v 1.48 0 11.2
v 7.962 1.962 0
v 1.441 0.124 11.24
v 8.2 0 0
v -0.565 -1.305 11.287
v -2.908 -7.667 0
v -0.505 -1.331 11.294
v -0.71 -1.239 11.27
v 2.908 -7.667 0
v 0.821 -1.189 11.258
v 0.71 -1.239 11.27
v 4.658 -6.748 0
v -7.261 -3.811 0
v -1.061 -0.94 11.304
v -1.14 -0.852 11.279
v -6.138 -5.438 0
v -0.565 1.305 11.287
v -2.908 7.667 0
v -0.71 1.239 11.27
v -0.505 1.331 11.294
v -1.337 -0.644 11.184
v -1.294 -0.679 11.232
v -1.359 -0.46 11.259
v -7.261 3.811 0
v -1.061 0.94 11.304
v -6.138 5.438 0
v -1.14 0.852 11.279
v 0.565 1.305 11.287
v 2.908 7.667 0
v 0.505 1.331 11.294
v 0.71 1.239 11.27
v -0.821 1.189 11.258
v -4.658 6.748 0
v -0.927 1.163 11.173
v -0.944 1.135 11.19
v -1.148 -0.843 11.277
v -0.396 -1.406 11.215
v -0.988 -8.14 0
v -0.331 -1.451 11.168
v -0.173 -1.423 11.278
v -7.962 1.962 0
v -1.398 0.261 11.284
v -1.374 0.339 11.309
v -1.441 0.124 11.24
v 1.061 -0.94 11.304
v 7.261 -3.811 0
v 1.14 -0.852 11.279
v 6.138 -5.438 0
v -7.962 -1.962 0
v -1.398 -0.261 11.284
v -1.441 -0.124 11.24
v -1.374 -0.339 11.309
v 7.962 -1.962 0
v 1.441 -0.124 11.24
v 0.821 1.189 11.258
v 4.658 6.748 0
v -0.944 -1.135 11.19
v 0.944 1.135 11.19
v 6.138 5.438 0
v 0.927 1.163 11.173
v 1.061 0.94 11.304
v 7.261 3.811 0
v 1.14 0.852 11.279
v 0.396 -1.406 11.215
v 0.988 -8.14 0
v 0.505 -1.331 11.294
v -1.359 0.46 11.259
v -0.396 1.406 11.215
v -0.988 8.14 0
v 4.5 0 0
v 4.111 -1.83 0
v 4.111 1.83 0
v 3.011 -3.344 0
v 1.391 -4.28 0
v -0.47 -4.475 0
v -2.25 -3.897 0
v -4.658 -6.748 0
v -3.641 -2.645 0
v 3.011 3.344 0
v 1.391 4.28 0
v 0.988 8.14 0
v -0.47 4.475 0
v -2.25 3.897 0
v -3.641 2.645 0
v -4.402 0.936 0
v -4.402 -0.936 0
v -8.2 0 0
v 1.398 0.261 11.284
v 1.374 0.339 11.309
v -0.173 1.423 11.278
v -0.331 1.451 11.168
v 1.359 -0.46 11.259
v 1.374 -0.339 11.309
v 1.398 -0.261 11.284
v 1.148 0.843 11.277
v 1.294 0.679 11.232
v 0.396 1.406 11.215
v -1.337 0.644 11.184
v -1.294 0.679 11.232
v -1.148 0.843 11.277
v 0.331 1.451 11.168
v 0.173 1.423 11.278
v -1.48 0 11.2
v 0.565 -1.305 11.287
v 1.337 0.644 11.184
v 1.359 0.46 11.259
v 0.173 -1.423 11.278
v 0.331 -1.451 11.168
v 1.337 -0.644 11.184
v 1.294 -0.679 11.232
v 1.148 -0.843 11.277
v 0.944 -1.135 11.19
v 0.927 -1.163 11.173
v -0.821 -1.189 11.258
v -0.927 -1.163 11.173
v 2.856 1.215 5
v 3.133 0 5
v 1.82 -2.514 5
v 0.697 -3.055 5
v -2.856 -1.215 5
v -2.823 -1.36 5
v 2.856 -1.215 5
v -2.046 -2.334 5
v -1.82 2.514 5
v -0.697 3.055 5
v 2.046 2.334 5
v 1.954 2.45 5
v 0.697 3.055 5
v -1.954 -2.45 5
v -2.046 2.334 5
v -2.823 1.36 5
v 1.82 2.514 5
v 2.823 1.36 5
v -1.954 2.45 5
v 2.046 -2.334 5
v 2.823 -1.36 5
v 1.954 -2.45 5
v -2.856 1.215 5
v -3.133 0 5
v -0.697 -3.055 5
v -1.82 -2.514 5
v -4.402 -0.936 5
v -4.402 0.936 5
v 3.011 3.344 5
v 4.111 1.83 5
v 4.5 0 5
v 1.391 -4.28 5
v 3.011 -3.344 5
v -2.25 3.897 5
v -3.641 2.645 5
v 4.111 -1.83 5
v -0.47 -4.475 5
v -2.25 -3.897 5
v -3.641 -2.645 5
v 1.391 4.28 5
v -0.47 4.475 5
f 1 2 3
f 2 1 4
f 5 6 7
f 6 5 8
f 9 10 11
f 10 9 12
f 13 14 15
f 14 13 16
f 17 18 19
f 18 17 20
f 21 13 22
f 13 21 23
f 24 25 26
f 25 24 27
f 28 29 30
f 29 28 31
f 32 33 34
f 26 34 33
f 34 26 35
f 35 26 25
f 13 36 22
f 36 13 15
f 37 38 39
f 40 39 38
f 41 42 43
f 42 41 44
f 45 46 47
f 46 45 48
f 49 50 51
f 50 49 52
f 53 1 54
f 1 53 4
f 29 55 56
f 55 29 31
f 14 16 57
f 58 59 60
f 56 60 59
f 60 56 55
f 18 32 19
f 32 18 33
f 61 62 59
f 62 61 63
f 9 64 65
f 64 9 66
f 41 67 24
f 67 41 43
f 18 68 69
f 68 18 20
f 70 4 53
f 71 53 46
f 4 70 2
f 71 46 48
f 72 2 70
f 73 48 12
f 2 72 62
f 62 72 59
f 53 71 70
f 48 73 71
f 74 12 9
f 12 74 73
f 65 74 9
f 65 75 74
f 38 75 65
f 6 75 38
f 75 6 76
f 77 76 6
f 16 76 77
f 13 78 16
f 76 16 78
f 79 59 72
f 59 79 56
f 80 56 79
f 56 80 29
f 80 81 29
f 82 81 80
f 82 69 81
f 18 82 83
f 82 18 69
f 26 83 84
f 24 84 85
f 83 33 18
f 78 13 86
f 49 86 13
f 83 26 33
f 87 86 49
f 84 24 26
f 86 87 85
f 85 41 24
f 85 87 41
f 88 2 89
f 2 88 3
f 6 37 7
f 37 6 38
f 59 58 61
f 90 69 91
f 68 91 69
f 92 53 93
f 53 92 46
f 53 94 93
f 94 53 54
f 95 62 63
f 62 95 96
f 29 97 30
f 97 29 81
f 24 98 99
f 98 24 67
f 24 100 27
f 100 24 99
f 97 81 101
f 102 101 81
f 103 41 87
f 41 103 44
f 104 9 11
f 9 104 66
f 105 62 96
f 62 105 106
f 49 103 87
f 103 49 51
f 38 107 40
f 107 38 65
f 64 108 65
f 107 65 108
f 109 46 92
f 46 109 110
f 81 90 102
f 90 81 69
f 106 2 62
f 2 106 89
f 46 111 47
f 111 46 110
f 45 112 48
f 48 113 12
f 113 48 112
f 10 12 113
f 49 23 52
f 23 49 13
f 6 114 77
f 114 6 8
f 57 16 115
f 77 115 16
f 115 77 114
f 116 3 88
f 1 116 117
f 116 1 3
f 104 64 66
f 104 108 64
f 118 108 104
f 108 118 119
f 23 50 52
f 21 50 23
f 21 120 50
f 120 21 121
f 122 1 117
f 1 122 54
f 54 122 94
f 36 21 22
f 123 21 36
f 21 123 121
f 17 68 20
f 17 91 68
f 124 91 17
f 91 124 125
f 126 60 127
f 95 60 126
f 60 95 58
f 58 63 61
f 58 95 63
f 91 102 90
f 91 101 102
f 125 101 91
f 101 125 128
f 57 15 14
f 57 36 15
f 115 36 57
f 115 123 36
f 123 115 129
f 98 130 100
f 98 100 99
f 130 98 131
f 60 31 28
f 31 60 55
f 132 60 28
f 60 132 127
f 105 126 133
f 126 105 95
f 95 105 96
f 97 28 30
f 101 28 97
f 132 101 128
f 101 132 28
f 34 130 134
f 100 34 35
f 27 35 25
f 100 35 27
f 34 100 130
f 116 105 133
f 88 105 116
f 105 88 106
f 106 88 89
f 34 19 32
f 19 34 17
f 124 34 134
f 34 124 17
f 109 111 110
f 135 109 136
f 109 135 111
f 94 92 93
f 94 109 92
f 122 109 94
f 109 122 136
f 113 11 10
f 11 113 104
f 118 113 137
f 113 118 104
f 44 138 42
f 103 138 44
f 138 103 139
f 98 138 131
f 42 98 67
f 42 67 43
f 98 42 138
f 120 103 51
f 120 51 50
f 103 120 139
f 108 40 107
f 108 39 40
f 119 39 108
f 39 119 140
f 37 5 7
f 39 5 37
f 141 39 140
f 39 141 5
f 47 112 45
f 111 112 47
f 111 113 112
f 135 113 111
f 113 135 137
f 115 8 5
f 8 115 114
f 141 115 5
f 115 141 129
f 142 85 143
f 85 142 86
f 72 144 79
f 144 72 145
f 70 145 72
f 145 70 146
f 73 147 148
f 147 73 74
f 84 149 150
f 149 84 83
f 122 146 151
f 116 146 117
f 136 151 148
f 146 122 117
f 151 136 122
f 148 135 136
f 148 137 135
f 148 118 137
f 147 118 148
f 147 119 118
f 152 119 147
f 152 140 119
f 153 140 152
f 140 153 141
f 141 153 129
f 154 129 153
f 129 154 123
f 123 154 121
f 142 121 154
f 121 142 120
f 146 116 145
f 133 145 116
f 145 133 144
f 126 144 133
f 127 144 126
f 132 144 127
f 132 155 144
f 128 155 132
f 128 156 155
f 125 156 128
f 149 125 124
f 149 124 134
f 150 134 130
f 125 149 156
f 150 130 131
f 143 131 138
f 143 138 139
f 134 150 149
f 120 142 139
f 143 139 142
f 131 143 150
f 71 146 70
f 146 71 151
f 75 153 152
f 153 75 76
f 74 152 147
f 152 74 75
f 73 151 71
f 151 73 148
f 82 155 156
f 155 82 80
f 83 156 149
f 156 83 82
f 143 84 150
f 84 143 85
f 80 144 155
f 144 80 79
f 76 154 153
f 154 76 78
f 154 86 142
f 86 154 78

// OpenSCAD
// file: ../robot_settings.scad
main_box_x = 100; // 96
main_box_y = 102;
main_box_z = 74; // 74.5

lfp_main_box_x = 65;
lfp_main_box_y = 152;
lfp_main_box_z = 94;

wall_thickness = 5;

rail_gap = 2;
rail_inset = 7;

rail_thickness = 7;
rail_length = 250;
rail_width = 260;

lfp_battery_width = 65.5;
lfp_battery_depth = 150.5;
lfp_battery_height = 93;
lfp_battery_midterrace_width = 64.8;
lfp_battery_midterrace_depth = 150.2;
lfp_battery_midterrace_height = 7.8;
lfp_battery_topterrace_width = 62.8;
lfp_battery_topterrace_depth = 149.4;
lfp_battery_topterrace_height = 6.6;

// red right
// black left
lfp_battery_terminal_width = 9.2;
lfp_battery_terminal_depth = 9.5;
lfp_battery_terminal_depth_setback = 4.4;
lfp_battery_terminal_width_setback = 5.9;

raspberry_pi_screw_seperation_y = 57;
raspberry_pi_screw_seperation_z = 48;
raspberry_pi_peg_h = 5;

battery_box_peg_h = 6;
battery_box_peg_d = 9.5;
battery_box_peg_cutout = 5;

gears_module = 1;
pinion_gear_teeth = 32;
pinion_gear_width = 5;
pinion_gear_bore = 8;

gears_setback_distance = 25;
gear_post_height = 2 * pinion_gear_width + rail_thickness + 8 ;

steering_motor_mount_x = 45;
steering_motor_mount_y = 36;
steering_motor_mount_z = 18;
steering_motor_mount_setback_distance = gears_setback_distance + 16;

cradle_wall_thickness = 5;
post_thickness_x_y = 10;
post_wallside_position_y = 12.5;
post_separation_y = 47.5;
post_x_position = 70; // width of cradle. this is proportional to rail_width.

imu_width = 26; // x is along the width axis
imu_depth = 16; // y is along the depth axes. +y points at pins.
imu_screw_d = 3;
imu_screw_corner_border = 1.27;
imu_underside_pin_h = 1; // z is along the h axis
imu_thickness = 1.6;
imu_left_edge_pins = 1.6;

dc_motor_drivertype = "Teyleten"; // Teyleten
isAdafruit = (dc_motor_drivertype == "Adafruit");

drv8871_x = isAdafruit ? 20.3 : 21.6;
drv8871_y = isAdafruit ?  24 : 25;

drv8871_z = 2;
drv8871_screw_d = 2.5;
drv8871_solder_points_z = 2;

drv8871mount_edge_x = 1.5;
drv8871mount_edge_wall = 3;
drv8871mount_z = 5;
drv8871mount_x = drv8871_x +  drv8871mount_edge_wall - 2* drv8871mount_edge_x;
drv8871mount_y = 19;

drv8871_screw_distance = 15.64;
drv8871_solder_points_d = 1.66;
drv8871_solder_offset_y = 4.4;
drv8871_solder_inner_points_distance = 5;
drv8871_solder_outer_points_distance = 12;

dc_motor_75_1_encoder_z = 14.75;
dc_motor_75_1_encoder_d = 24.5;
dc_motor_75_1_housing_z = 30;
dc_motor_75_1_housing_d = 24.1;
dc_motor_75_1_gearbox_z = 23;
dc_motor_75_1_gearbox_d = 24.8;
dc_motor_75_1_z = dc_motor_75_1_encoder_z + dc_motor_75_1_housing_z + dc_motor_75_1_gearbox_z;

dc_motor_housing_minus_encoder_z = 48;
dc_motor_encoder_z = 9.33;
dc_motor_encoder_wheel_d = 13.4;
dc_motor_encoder_wheel_thickness = 5;
dc_motor_encoder_wheel_gap = 3;
dc_motor_encoder_circuit_thickness = 2;
dc_motor_z = dc_motor_housing_minus_encoder_z + dc_motor_encoder_z + dc_motor_encoder_wheel_thickness + dc_motor_encoder_wheel_gap + dc_motor_encoder_circuit_thickness;
dc_motor_cutout_d = 24.8;
dc_motor_cutout_z = 19.5;


M3_shaft_d = 2.82;

dc_motor_screw_head_z = 2;
dc_motor_screw_head_d = 5.6;
dc_motor_screw_d = 3.2;
dc_motor_screw_offset = 8.5;

dc_motor_axle_ring_z = 3;
dc_motor_axle_ring_d = 7.2;
dc_motor_axle_cutout_d = 4.2;
dc_motor_axle_cutout_z = 10;
dc_motor_axle_notch_cutout = 0.4;
dc_motor_axle_notch_cutout_z = 6;

pdmount_x = 20;
pdmount_y = 30;
pdmount_z = 2;
pdmount_edge_x = 1.5;
pdmount_edge_wall = 3;

steering_shaft_z = 45;
steering_shaft_d = 7;
steering_shaft_motor_fitting_d = 9;
coupler_length = 24.6;
coupler_diameter = 14;
coupler_screw_d = 4;
coupler_screw_z_offset = 8.3;
coupler_gear_side_insert = 12.6;
steering_shaft_with_coupler_z = steering_shaft_z - coupler_gear_side_insert;

lidar_mount_y = 110;
lidar_mount_x = 65 + 20;
lidar_narrow_screws = 40;
lidar_wide_screws = 56;
lidar_front_to_back_screws = 70;
lidar_screw_d = 3;
lidar_circuitboard_x = 20;
lidar_circuitboard_y = 35;
lidar_circuitboard_z = 1.2;
lidar_cord_length = 29;

ball_bearing_height = 7;
ball_bearing_outer_diameter = 22;
ball_bearing_inner_diameter = 8;

M4_diameter = 5.1;
M3_diameter = 2.9;
M3_length = 35;
M3_cap_length= 3;
M3_cap_diameter = 5.44;

suspension_spring_outer_diameter = 8;
suspension_spring_inner_diameter = 5.3;

armature_holder_height = 20;
armature_holder_thickness = 8;
pull_bar_peg_r = 3.2;
apparatus_locking_peg_d = 4;

rack_module = 1;
rack_length = main_box_x;
rack_height = 5;
rack_width = 10;
rack_teeth = 30;
rack_bore = 3;

pull_bar_length = rail_width / 2 - rack_length + 1;

// tire hardware
axle_length = 42.0; 
axle_reciever_inner_diameter = ball_bearing_inner_diameter;
axle_reciever_outer_diameter = 12;
axle_reciever_length = 18.8;
axle_notch_length = 15;
axle_notch_cutout = 2.4;

// power distribution bar
power_bar_cutout_x = 96;
power_bar_y = 19.1;
power_bar_z = 1.5;
power_bar_screw_distance = 91.4;
power_bar_screw_d = 2.8;
power_bar_standoff_z = 5;
power_bar_standoff_d = 6.83;

pico_expander_width = 63;
pico_expander_height = 57;
pico_screw_hole_offset = 3;
pico_screw_hole_d = 2.5;

usbhub_thickness = 11.7;
usbhub_depth = 37.5;
usbhub_width = 86.7;
usbhub_end_port_width = 14.8;
usbhub_end_port_height = 12;
usbhub_front_face_safe_zone_left = 15;
usbhub_front_face_safe_zone_right = 14.8;

switch_w = 16;
switch_cutout_d = 12.2;
switch_bump_h = 2;
switch_bump_l = 18.2;

i2c_mount_thickness = 3;
i2c_w = 28;
i2c_l = 28;
i2c_circuitboard_thickness = 1.23;
i2c_bottom_notch_w = 14.35;
i2c_bottom_notch_depth = 1;
i2c_screw_hole_d = 1.9;
i2c_screw_hole_offset = 1.4;
i2c_pin_l = 11;
i2c_pin_d = 0.8;
i2c_pin_offset = 1.5;
i2c_pin_separation = 2.5;
i2c_all_pins_l = 8.3;
i2c_screen_thickness = 1.88;
i2c_screen_w = 14.6;
i2c_screen_d = 27;
i2c_screen_offset = 4.1;
// main file
include <../robot_settings.scad>

module spring_collar()
{
        difference() {
          cylinder(h = 5, r1 = ball_bearing_inner_diameter + .2, ball_bearing_outer_diameter / 2 + 1);
          
          translate([0, 0, 1])
          cylinder(h = 5, r1 = ball_bearing_inner_diameter / 2 + .2, ball_bearing_outer_diameter /2 + 1); 
          
          translate([0, 0, -5])
          cylinder(h = 10, d = ball_bearing_inner_diameter + 1);
        }
}
spring_collar();
